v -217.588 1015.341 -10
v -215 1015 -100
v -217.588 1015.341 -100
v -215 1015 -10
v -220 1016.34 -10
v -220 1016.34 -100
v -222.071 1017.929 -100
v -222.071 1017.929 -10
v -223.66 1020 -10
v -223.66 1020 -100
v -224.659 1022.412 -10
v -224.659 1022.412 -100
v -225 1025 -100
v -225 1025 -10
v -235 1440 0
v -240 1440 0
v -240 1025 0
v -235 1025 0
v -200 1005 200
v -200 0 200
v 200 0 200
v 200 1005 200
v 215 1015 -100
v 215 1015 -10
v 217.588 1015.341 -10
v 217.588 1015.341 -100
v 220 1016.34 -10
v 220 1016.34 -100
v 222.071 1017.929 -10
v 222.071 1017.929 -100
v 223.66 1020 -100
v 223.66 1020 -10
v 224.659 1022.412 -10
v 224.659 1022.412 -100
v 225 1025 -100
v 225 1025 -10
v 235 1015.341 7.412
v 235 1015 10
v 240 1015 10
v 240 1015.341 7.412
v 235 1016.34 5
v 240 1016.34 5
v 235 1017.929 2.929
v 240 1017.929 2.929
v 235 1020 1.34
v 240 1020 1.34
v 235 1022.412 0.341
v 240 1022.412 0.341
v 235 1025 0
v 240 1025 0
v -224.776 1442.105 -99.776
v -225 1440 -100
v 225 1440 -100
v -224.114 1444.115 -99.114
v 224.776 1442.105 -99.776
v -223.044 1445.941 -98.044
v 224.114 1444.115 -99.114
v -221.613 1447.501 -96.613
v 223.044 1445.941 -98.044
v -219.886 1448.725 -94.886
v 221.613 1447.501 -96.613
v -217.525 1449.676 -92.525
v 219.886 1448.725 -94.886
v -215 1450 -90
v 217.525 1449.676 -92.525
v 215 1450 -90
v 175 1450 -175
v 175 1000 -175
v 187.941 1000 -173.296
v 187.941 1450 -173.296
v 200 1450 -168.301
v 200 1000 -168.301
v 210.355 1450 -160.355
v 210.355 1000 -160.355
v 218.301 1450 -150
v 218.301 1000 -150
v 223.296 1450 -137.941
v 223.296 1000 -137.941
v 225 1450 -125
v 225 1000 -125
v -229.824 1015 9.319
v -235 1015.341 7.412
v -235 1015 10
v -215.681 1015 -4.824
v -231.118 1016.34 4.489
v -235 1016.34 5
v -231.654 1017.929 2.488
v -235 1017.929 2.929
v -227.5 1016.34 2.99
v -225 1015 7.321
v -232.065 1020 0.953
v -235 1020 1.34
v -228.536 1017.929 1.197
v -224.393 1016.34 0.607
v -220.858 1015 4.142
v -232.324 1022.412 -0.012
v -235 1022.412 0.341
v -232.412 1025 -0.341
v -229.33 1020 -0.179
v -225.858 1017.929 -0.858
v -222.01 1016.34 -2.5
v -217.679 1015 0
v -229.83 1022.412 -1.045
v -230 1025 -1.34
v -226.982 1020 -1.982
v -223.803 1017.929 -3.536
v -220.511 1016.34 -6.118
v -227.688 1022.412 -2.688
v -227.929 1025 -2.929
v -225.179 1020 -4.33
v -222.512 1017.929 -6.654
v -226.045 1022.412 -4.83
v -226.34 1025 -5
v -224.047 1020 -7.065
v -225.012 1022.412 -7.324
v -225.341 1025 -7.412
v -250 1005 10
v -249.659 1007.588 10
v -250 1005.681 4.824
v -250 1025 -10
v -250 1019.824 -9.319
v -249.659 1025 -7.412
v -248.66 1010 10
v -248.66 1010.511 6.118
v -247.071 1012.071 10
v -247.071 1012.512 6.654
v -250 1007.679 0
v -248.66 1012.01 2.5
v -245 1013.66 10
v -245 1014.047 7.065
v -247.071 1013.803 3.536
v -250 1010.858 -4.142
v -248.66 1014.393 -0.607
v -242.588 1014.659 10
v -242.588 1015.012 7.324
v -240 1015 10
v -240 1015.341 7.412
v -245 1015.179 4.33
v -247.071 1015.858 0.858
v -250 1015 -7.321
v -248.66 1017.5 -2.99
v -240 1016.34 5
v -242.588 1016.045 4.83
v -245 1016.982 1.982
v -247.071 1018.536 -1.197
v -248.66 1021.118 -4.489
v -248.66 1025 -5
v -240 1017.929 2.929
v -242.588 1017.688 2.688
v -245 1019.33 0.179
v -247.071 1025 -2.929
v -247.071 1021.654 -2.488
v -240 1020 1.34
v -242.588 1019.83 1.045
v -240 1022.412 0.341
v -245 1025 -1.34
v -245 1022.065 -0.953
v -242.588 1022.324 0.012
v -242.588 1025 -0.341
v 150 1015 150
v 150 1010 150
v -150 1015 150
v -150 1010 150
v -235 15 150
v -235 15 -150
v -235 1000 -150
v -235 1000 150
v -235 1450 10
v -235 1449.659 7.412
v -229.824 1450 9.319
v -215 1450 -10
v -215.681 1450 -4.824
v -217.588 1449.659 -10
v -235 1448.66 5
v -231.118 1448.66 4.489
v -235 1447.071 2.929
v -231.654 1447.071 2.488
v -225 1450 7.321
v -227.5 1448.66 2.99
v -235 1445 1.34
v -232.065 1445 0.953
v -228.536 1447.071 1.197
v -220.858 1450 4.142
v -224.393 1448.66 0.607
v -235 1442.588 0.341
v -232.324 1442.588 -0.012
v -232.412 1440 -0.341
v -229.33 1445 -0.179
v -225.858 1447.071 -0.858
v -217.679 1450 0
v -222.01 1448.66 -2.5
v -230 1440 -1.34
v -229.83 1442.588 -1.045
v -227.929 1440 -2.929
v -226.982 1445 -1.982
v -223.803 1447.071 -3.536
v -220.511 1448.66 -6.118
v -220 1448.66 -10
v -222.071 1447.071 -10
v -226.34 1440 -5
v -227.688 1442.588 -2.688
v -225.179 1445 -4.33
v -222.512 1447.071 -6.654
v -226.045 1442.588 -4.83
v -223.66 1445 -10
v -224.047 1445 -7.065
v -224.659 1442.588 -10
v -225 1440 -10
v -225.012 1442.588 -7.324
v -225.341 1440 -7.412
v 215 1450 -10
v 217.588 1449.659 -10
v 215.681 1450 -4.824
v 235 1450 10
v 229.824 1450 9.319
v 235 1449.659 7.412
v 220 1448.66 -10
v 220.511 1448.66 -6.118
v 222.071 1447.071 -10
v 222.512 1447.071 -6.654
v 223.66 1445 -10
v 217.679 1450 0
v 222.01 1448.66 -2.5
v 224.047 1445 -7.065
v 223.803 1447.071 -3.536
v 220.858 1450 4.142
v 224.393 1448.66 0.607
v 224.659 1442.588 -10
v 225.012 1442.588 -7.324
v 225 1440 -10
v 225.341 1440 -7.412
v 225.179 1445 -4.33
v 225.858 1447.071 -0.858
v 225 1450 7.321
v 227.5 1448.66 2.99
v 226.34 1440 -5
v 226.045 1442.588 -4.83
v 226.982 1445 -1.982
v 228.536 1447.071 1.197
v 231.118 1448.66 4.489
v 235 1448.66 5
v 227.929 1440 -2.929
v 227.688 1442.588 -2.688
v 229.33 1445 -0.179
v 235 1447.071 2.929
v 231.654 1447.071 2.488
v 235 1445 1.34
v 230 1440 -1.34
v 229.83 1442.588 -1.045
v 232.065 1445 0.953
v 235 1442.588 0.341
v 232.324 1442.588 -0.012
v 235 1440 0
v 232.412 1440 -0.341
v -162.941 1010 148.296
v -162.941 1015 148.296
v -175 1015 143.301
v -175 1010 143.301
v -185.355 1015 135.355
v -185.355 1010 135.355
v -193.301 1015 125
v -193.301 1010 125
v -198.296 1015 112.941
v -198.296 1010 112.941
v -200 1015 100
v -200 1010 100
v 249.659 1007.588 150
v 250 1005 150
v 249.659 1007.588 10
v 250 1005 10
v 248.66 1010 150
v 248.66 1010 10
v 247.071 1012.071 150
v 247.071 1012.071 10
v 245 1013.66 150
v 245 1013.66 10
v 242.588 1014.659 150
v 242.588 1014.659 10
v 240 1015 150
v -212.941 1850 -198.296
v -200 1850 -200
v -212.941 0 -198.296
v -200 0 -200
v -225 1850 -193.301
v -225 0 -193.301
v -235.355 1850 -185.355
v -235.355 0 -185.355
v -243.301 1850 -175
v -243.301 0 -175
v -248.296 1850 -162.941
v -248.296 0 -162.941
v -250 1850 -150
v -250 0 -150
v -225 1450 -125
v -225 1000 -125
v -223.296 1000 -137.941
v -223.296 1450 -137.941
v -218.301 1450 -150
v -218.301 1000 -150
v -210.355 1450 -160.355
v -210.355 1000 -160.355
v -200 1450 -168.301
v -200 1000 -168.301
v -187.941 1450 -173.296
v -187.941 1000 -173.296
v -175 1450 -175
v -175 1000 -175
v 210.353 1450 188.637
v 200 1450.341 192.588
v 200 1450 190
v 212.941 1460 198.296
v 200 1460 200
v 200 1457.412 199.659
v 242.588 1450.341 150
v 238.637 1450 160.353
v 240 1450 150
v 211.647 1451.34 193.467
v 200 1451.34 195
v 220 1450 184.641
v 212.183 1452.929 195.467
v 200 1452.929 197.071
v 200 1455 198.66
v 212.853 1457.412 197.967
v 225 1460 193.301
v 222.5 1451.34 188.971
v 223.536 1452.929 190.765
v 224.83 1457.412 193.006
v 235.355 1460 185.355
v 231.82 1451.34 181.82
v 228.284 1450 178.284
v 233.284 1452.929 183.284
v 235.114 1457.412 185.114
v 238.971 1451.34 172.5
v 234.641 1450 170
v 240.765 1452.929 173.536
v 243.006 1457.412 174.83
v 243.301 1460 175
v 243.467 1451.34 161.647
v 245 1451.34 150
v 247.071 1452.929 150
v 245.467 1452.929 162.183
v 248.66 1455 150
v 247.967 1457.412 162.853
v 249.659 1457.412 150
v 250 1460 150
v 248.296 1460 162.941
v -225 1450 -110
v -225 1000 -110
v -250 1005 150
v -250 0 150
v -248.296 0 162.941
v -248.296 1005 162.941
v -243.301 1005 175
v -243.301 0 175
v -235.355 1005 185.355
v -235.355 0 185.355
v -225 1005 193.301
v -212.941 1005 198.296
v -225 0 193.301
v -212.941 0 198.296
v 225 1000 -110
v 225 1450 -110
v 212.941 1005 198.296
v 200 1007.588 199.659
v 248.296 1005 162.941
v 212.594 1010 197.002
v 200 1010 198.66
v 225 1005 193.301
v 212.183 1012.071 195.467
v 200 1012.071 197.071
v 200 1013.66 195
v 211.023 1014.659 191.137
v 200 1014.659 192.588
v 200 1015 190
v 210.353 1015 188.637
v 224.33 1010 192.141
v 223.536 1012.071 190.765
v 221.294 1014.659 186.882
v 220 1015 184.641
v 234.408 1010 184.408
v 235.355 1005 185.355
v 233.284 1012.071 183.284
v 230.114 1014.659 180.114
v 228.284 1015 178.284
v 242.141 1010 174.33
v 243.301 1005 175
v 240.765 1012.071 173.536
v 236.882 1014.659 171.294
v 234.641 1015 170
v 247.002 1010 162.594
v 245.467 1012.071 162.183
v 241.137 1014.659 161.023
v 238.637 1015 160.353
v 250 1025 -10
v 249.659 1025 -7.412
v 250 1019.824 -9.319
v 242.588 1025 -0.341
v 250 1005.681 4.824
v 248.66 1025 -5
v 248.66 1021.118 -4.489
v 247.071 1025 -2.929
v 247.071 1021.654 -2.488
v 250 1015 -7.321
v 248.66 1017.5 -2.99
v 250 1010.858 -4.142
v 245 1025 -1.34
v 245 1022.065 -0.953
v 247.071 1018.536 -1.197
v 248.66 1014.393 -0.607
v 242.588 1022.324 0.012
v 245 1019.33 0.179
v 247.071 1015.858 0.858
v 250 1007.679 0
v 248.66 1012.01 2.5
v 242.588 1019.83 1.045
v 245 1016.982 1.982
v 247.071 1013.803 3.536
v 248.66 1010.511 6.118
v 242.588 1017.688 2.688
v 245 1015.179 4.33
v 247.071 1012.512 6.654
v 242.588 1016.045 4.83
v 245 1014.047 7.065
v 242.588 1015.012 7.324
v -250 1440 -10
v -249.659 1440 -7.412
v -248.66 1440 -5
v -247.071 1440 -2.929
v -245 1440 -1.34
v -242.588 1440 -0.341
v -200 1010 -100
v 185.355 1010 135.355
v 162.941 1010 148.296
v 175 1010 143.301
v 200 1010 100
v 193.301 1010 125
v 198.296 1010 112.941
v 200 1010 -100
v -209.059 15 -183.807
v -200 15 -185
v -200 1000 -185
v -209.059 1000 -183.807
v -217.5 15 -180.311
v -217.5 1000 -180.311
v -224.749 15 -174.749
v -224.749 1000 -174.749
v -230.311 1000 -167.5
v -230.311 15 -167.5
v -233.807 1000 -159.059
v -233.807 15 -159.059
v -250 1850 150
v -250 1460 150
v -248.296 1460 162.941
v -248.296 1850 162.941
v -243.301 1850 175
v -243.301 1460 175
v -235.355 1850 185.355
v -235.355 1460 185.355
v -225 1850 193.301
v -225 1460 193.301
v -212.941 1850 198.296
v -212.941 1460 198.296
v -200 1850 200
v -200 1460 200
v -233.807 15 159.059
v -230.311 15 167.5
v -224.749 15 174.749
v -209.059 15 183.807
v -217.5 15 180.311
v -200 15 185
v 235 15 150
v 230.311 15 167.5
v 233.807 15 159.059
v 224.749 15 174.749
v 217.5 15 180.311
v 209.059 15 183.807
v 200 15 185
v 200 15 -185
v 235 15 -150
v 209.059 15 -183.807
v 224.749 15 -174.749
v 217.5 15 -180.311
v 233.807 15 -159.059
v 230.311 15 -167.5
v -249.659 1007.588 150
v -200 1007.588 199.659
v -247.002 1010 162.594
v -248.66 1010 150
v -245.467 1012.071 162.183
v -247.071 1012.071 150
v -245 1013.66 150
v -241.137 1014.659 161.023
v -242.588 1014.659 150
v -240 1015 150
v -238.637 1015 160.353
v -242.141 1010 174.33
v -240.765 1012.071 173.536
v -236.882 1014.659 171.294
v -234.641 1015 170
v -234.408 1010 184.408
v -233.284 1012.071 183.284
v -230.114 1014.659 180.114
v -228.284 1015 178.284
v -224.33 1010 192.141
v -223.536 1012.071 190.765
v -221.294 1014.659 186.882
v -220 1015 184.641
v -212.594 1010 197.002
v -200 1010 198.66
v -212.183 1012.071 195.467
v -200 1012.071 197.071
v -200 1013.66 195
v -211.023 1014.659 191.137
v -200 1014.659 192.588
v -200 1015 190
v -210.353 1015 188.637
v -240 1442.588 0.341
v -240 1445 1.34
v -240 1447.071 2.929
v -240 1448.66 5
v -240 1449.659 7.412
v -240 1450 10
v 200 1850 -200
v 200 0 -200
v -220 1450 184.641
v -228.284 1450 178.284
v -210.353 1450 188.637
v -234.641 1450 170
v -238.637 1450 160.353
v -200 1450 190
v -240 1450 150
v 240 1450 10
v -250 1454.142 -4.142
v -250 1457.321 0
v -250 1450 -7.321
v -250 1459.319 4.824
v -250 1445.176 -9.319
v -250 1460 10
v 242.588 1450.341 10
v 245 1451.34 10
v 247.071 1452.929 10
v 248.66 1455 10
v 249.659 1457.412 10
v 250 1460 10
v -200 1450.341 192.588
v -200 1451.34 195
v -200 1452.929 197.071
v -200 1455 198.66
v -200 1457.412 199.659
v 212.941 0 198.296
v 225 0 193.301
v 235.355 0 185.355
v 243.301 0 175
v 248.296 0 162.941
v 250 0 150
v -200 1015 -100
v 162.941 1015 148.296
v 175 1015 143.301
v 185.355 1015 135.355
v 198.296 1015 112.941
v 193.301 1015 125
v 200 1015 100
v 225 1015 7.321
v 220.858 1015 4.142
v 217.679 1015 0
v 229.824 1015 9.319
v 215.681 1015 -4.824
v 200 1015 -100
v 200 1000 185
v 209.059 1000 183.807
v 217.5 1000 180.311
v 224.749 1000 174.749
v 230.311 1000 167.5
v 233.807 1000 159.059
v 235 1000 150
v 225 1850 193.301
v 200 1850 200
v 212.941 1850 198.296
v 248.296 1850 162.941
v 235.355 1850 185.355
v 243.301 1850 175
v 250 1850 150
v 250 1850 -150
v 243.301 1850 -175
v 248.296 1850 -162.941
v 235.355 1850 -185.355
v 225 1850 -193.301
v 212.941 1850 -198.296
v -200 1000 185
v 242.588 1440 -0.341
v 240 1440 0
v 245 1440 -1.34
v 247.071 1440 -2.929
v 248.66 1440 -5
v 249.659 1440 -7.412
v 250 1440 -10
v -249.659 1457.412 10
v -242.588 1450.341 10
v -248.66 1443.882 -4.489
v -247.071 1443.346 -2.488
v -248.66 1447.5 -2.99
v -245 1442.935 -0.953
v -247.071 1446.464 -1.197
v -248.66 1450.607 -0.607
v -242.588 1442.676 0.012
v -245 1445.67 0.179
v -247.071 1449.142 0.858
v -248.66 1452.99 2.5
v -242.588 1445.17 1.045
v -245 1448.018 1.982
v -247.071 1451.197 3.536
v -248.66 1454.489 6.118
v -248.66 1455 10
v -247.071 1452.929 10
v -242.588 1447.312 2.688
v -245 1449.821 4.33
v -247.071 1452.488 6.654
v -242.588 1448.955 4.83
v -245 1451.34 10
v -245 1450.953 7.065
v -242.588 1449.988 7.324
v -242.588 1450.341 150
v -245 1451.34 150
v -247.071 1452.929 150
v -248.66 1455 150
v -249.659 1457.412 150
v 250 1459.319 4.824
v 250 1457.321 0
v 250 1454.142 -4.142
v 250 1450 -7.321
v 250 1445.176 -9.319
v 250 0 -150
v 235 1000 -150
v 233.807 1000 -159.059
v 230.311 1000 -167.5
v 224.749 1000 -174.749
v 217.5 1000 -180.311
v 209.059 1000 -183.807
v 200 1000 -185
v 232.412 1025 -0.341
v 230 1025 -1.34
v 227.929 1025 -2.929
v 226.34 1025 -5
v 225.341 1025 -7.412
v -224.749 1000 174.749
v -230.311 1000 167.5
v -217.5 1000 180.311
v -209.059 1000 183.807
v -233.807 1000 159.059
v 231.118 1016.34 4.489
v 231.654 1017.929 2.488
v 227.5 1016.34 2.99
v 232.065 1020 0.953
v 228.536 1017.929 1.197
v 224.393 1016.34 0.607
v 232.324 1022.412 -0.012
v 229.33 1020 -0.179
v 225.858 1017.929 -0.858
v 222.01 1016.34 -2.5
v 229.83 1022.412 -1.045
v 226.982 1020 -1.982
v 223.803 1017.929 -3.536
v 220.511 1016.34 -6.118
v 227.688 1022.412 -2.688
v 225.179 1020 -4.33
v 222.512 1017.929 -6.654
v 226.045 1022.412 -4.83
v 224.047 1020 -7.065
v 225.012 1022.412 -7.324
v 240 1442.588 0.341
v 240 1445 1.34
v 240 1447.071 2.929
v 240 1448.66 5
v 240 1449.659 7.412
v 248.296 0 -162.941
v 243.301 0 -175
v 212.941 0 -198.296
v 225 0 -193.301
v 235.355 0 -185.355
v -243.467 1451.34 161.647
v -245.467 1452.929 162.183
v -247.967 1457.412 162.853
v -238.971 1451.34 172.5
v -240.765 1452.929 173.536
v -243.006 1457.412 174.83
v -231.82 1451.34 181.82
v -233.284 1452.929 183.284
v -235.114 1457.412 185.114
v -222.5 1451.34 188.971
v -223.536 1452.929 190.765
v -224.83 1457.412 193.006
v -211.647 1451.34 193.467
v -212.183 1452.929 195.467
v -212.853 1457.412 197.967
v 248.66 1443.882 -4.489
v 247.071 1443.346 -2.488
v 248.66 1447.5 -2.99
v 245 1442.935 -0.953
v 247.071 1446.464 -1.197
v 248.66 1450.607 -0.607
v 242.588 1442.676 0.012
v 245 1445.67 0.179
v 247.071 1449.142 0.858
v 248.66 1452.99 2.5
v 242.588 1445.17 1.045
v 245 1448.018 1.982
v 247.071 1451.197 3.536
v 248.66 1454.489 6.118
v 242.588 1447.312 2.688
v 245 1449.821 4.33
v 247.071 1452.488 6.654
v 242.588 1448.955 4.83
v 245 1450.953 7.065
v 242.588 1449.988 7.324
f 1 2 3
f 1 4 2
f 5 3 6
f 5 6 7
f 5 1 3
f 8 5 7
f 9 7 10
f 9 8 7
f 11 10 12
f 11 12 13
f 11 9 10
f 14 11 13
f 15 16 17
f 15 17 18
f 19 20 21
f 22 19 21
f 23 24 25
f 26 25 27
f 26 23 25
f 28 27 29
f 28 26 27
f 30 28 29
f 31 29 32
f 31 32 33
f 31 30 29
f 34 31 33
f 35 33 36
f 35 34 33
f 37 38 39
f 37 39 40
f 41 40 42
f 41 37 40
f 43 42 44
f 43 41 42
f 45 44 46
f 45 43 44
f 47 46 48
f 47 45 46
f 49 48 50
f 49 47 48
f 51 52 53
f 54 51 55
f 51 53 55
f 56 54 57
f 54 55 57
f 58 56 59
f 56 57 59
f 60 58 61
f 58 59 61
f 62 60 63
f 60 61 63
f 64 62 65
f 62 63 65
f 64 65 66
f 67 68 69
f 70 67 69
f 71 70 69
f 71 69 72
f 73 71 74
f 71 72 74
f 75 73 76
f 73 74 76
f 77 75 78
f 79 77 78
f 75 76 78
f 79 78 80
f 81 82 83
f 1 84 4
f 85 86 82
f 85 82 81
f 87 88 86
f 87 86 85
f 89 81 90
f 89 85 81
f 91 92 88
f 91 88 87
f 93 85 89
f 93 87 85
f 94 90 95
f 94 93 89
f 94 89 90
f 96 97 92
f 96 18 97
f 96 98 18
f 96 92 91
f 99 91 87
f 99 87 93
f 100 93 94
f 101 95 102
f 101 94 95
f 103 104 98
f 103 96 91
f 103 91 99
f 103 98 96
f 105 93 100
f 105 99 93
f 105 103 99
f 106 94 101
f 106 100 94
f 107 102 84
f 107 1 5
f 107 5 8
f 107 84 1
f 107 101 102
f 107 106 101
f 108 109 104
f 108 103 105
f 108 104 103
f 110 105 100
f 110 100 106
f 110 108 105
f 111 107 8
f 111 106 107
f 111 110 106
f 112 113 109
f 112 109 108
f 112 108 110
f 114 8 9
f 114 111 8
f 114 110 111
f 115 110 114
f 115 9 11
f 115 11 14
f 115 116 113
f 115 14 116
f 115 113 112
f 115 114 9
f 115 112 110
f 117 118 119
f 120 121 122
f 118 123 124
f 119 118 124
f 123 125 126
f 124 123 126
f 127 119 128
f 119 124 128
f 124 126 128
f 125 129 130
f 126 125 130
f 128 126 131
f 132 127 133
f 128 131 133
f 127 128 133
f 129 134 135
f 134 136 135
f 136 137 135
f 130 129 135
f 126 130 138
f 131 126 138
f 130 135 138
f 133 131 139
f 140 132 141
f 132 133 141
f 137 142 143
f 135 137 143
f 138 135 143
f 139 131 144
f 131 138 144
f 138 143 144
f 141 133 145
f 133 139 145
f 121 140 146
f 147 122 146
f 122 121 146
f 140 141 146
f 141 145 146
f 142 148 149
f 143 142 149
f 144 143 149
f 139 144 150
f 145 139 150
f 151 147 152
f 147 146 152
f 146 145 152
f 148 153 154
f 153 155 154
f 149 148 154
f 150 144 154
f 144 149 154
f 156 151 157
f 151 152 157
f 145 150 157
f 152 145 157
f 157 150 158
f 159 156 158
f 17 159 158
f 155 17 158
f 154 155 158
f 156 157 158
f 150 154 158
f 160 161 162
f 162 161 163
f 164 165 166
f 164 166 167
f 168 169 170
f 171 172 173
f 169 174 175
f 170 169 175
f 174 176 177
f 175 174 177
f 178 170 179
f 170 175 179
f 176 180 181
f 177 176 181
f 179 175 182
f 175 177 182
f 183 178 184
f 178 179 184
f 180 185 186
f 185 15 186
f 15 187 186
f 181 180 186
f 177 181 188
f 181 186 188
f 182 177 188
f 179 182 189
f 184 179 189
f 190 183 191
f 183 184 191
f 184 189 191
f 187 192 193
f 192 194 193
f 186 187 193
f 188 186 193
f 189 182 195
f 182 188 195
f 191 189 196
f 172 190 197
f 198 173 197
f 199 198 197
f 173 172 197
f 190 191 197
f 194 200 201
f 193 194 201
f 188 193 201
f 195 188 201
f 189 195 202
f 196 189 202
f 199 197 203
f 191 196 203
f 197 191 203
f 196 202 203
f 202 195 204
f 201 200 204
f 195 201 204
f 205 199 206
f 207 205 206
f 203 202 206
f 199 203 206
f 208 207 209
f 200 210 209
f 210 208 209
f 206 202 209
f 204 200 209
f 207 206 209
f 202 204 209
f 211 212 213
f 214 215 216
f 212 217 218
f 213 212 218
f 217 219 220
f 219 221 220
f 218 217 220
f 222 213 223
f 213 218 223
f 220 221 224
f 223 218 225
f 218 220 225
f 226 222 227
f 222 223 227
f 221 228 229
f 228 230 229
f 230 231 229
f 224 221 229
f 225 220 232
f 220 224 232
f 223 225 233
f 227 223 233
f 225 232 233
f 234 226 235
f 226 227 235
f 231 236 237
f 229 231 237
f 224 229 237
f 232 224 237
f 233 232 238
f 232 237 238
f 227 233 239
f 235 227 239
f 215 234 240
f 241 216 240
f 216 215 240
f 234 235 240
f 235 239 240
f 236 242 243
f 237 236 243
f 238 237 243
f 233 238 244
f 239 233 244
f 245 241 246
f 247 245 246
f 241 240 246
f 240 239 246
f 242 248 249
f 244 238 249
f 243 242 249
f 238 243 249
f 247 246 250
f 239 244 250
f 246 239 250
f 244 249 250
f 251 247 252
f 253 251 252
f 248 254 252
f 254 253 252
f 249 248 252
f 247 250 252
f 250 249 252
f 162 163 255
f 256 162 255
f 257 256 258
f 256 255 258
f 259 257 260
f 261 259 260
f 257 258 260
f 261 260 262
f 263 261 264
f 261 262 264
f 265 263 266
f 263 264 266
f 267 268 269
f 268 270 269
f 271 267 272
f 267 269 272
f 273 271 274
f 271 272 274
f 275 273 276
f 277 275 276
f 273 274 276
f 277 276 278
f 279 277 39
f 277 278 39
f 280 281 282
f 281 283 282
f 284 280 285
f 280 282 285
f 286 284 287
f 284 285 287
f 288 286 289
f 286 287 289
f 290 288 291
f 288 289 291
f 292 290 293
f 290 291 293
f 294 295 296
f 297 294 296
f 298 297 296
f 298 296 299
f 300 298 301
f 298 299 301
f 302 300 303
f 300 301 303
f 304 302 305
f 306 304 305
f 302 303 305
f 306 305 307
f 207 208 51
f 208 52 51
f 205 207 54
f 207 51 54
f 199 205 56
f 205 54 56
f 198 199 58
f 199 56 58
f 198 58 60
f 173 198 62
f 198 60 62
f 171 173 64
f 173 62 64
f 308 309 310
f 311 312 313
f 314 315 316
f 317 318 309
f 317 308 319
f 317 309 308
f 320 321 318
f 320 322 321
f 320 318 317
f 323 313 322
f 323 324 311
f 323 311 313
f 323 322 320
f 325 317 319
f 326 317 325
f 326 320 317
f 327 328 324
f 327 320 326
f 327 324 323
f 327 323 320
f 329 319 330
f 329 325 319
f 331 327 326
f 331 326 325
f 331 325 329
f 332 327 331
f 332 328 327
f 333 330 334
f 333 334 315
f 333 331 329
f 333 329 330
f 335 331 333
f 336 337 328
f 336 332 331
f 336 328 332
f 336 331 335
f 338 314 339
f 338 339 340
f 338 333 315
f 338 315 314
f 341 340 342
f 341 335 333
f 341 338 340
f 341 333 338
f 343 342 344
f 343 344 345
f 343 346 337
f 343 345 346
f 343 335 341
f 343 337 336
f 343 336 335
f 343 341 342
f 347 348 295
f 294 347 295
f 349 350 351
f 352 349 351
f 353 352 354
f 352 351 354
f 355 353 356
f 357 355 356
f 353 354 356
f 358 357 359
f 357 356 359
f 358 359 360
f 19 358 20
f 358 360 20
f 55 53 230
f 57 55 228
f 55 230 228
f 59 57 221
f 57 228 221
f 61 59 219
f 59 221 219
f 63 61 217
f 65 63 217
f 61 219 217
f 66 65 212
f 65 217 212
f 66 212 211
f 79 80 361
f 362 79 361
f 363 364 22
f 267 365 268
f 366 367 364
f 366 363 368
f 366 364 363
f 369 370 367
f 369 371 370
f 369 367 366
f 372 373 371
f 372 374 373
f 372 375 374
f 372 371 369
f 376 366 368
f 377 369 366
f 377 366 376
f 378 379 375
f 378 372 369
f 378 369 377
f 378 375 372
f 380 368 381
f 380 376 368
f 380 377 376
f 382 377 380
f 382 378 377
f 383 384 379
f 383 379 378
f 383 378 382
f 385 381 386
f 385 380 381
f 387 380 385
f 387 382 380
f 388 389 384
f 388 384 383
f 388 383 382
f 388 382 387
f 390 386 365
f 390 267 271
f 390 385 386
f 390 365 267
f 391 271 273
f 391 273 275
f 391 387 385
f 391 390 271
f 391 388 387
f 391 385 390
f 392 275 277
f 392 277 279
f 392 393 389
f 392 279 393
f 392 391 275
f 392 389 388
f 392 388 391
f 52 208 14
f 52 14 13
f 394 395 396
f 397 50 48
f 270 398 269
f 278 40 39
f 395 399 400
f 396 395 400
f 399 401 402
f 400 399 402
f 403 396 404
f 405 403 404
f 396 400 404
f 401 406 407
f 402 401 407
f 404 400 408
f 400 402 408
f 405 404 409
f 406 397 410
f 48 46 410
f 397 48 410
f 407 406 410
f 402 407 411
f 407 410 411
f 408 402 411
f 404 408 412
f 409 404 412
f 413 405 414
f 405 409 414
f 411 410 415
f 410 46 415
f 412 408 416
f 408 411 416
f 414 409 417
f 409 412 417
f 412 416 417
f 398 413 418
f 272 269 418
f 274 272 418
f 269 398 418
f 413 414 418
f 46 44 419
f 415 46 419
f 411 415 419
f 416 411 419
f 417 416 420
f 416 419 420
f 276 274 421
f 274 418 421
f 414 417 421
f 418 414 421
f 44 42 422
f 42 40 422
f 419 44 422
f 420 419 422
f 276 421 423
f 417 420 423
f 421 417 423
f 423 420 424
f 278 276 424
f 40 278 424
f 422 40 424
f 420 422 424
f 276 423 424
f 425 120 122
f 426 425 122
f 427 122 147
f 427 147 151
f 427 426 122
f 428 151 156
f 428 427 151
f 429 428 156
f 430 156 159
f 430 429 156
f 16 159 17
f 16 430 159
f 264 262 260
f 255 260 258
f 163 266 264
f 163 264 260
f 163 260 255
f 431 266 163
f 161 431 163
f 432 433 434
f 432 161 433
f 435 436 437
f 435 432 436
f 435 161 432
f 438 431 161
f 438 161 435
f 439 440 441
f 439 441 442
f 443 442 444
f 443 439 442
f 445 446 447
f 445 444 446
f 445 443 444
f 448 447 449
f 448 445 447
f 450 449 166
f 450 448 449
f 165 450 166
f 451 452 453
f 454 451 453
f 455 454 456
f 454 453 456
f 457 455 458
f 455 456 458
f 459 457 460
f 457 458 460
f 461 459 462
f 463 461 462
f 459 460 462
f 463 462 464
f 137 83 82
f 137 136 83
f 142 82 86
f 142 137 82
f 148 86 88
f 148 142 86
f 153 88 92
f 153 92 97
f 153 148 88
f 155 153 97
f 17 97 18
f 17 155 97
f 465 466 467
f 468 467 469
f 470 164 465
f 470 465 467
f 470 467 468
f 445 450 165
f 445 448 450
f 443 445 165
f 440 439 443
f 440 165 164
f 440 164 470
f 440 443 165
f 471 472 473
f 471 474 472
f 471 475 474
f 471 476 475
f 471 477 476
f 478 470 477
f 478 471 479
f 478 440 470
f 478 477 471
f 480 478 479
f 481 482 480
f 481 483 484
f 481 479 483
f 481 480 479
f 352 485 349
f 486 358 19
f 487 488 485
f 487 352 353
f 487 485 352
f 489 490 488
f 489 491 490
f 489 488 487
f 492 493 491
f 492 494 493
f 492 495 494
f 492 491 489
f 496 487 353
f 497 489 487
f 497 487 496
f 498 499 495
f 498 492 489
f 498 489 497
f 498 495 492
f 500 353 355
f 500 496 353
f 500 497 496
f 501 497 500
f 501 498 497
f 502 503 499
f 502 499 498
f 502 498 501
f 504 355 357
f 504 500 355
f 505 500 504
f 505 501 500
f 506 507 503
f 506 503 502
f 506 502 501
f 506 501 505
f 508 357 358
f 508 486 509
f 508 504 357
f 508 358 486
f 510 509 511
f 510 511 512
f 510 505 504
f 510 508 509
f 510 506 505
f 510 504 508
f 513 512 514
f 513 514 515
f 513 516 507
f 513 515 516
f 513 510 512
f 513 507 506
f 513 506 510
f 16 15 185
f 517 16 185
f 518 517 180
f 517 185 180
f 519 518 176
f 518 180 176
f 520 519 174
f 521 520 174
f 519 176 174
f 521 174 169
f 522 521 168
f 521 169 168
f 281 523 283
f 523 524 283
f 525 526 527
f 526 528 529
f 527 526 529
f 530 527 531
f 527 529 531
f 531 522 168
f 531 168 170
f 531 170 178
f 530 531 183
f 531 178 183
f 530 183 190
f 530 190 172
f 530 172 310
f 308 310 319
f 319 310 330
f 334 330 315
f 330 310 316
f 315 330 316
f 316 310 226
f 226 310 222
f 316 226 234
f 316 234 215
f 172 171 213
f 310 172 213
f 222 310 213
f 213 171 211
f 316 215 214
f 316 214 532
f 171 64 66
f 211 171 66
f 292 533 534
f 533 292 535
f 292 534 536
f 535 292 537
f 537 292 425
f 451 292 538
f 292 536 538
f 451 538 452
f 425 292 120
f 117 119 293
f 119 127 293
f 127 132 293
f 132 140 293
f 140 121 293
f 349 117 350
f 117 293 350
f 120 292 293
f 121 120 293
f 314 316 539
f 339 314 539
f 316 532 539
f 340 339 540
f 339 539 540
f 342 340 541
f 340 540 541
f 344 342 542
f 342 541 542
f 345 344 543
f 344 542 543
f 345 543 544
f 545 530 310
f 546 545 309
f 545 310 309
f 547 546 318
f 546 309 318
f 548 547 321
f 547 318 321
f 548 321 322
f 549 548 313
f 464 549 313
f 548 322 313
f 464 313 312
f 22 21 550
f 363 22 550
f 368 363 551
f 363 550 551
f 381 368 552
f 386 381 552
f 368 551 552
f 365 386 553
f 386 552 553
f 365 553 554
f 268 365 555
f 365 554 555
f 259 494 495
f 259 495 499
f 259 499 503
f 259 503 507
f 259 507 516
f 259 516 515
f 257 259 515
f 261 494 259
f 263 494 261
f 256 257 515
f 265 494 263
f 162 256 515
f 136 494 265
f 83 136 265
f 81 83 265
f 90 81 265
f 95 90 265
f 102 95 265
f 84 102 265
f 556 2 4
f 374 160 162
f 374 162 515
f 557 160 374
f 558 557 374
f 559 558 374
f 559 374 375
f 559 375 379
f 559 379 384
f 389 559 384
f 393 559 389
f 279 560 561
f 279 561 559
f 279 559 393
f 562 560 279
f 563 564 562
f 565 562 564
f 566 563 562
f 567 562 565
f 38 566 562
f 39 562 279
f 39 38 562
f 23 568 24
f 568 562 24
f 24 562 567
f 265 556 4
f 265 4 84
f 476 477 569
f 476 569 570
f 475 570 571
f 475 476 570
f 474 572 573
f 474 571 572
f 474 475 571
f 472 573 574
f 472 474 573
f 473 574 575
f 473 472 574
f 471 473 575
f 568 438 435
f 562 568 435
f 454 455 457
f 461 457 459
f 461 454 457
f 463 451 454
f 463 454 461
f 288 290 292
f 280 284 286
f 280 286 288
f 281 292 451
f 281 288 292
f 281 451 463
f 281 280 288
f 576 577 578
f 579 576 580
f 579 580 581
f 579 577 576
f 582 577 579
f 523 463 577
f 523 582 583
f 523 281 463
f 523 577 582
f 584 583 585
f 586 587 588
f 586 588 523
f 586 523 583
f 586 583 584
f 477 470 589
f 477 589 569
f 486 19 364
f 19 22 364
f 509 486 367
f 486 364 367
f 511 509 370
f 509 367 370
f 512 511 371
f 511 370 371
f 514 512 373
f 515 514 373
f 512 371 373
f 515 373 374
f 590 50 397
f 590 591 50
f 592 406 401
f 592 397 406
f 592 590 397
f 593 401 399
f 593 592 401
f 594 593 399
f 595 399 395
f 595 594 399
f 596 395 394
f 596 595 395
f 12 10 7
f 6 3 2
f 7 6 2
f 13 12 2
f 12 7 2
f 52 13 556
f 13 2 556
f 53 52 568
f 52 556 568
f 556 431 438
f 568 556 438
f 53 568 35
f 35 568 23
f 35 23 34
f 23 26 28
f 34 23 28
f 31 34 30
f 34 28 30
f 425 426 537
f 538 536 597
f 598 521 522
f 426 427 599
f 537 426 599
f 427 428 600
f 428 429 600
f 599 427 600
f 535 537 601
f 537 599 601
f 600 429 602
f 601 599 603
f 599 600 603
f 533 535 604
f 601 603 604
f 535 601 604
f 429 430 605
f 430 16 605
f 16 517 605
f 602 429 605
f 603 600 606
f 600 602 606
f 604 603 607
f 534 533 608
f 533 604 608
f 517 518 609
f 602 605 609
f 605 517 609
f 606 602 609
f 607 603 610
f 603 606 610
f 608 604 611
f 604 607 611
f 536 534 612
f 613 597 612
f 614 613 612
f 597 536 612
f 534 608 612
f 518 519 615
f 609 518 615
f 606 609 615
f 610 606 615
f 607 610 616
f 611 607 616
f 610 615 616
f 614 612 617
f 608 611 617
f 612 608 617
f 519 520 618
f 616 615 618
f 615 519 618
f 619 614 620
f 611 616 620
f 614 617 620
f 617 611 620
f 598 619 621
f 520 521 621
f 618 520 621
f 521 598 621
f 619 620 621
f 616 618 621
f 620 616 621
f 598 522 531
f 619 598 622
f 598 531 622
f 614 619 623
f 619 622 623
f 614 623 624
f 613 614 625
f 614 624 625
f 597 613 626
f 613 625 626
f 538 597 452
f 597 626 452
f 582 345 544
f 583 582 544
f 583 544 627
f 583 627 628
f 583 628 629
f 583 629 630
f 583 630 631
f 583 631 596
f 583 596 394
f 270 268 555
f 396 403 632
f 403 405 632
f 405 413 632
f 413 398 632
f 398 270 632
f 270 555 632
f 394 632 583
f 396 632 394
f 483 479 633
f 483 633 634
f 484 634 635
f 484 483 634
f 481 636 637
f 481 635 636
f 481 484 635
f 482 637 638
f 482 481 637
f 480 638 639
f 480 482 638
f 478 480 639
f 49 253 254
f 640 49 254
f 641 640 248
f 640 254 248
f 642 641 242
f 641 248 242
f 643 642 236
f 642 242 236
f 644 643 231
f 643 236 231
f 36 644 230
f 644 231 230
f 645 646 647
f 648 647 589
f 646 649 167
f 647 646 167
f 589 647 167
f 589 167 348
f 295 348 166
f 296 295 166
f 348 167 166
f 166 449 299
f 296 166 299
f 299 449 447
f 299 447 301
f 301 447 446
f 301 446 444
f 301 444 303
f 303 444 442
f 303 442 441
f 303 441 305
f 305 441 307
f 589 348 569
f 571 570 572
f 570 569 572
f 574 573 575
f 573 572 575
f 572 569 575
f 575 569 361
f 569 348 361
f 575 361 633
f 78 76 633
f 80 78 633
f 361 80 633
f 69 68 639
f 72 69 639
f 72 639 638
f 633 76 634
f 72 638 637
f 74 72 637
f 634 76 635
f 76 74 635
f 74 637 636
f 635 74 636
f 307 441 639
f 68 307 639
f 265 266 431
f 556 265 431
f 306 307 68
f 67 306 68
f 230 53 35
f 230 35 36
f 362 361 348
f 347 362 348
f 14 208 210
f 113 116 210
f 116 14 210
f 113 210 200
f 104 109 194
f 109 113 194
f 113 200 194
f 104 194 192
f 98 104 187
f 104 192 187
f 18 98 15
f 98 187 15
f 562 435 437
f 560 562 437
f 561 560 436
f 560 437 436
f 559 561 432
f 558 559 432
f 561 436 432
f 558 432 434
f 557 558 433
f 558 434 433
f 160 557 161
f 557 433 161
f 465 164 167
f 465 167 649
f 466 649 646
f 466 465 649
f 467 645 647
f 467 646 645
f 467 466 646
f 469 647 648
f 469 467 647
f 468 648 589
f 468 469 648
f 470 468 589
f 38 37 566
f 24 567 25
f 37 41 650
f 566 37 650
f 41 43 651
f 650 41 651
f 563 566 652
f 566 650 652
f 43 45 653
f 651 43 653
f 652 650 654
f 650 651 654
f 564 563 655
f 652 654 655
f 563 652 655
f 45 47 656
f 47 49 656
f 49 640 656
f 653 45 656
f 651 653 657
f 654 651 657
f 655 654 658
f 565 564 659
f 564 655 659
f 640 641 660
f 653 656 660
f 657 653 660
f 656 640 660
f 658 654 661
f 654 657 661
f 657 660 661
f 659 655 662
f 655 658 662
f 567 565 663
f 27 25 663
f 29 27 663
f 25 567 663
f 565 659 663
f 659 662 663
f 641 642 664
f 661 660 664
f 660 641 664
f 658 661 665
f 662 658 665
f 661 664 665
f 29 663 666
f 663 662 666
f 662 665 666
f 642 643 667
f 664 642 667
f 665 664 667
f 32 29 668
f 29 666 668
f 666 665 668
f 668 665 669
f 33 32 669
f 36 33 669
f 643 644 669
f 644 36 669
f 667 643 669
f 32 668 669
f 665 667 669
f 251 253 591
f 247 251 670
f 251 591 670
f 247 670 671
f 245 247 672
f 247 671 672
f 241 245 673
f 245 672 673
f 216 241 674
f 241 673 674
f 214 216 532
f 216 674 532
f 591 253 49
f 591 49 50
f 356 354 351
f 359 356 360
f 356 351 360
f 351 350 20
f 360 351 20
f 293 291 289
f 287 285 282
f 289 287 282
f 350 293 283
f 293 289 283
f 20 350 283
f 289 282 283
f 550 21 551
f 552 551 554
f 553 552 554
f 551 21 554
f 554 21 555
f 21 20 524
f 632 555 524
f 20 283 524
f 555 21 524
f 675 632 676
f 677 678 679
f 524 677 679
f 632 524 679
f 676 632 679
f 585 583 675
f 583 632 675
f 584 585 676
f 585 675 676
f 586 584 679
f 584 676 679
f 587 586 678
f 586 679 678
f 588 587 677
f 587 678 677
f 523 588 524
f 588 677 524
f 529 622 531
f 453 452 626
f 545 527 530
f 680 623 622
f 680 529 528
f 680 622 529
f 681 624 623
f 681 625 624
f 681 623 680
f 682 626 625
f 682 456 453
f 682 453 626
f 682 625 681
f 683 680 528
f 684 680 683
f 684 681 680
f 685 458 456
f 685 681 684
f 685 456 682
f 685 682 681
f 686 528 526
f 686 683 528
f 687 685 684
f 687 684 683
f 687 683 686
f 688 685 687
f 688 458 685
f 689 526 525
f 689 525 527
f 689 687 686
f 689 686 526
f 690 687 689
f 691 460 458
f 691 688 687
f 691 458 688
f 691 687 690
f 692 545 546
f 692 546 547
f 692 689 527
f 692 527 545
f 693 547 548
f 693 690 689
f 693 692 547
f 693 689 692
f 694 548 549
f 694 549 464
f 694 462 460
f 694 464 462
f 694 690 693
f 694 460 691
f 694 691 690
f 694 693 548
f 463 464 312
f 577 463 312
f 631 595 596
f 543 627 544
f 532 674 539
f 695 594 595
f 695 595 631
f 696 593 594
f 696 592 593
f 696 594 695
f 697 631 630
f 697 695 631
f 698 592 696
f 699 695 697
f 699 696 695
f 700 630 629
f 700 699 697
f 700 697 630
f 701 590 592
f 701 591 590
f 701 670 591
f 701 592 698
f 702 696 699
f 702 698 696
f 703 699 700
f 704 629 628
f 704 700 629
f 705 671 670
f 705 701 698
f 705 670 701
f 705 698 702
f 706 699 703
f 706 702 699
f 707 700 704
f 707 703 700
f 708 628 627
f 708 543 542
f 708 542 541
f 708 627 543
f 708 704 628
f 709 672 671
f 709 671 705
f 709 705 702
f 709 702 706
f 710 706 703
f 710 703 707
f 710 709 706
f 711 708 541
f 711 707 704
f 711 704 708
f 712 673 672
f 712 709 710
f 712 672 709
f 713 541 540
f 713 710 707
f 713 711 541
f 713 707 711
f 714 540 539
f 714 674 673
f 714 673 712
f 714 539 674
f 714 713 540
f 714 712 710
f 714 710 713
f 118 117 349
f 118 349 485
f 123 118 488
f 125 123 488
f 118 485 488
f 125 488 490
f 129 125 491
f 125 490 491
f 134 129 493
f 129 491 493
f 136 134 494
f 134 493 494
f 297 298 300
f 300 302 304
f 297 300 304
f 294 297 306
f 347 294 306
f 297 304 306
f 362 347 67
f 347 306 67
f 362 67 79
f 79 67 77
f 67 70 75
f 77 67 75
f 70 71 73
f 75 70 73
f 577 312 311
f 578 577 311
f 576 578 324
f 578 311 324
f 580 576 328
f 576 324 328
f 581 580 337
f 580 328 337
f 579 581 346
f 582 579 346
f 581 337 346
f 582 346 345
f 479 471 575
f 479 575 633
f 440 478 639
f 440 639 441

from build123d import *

# Parameters (mm, degrees)
BOSS_EXTRUDE1_DEPTH = 1000
SHELL1_T            = -15
BOSS_EXTRUDE2_DEPTH = 10
BOSS_EXTRUDE3_DEPTH = 15
BOSS_EXTRUDE4_DEPTH = 450
BOSS_EXTRUDE7_DEPTH = 450
BOSS_EXTRUDE8_DEPTH = 400
FILLET3_R           = 10


# Read off the part's stored shape, not the designer's step: Boss-Extrude3
with BuildPart() as part:
    # Sketch1 → Boss-Extrude1 (new body)
    with BuildSketch(Plane(origin=(0, 0, 0), x_dir=(1, 0, 0), z_dir=(0, 1, 0))):
        with BuildLine():
            Line((-200, -200), (200, -200))
            ThreePointArc((200, -200), (235.355339059, -185.355339059), (250, -150))
            Line((250, -150), (250, 150))
            ThreePointArc((250, 150), (235.355339059, 185.355339059), (200, 200))
            Line((200, 200), (-200, 200))
            ThreePointArc((-200, 200), (-235.355339059, 185.355339059), (-250, 150))
            Line((-250, 150), (-250, -150))
            ThreePointArc((-250, -150), (-235.355339059, -185.355339059), (-200, -200))
        make_face()
    extrude(amount=BOSS_EXTRUDE1_DEPTH)

    # Shell1
    shell1_openings = [part.faces().sort_by_distance(p)[0] for p in [
        (0, 1000, 0),
    ]]
    offset(amount=SHELL1_T, openings=shell1_openings, kind=Kind.INTERSECTION)

    # Sketch3 → Boss-Extrude2 (add)
    with BuildSketch(Plane(origin=(0, 1000, 0), x_dir=(1, 0, 0), z_dir=(0, 1, 0))):
        with BuildLine():
            Line((200, 0), (200, 100))
            Line((200, 100), (-200, 100))
            Line((-200, 100), (-200, 0))
            Line((-200, 0), (-250, 0))
            Line((-250, 0), (-250, -150))
            ThreePointArc((-250, -150), (-235.355339059, -185.355339059), (-200, -200))
            Line((-200, -200), (200, -200))
            ThreePointArc((200, -200), (235.355339059, -185.355339059), (250, -150))
            Line((250, -150), (250, 0))
            Line((250, 0), (200, 0))
        make_face()
    extrude(amount=BOSS_EXTRUDE2_DEPTH)

    # Boss-Extrude3 outline → Boss-Extrude3 (add)
    with BuildSketch(Plane(origin=(0, 1000, 0), x_dir=(1, 0, 0), z_dir=(0, 1, 0))):
        with BuildLine():
            Line((200, 100), (200, -100))
            ThreePointArc((200, -100), (185.355339059, -135.355339059), (150, -150))
            Line((150, -150), (-150, -150))
            ThreePointArc((-150, -150), (-185.355339059, -135.355339059), (-200, -100))
            Line((-200, -100), (-200, 100))
            ThreePointArc((-200, 100), (-199.74680765, 105.0254481), (-198.989794856, 110))
            Line((-198.989794856, 110), (-225, 110))
            Line((-225, 110), (-225, 0))
            Line((-225, 0), (-250, 0))
            Line((-250, 0), (-250, -150))
            ThreePointArc((-250, -150), (-235.355339059, -185.355339059), (-200, -200))
            Line((-200, -200), (200, -200))
            ThreePointArc((200, -200), (235.355339059, -185.355339059), (250, -150))
            Line((250, -150), (250, 0))
            Line((250, 0), (225, 0))
            Line((225, 0), (225, 110))
            Line((225, 110), (198.989794856, 110))
            ThreePointArc((198.989794856, 110), (199.74680765, 105.0254481), (200, 100))
        make_face()
    extrude(amount=BOSS_EXTRUDE3_DEPTH)

    # Sketch3<5> → Boss-Extrude4 (add)
    with BuildSketch(Plane(origin=(0, 1000, 0), x_dir=(1, 0, 0), z_dir=(0, 1, 0))):
        with BuildLine():
            Line((-250, 0), (-225, 0))
            Line((-225, 0), (-225, 100))
            Line((-225, 100), (-225, 110))
            Line((-225, 110), (-225, 125))
            ThreePointArc((-225, 125), (-210.355339059, 160.355339059), (-175, 175))
            Line((-175, 175), (175, 175))
            ThreePointArc((175, 175), (210.355339059, 160.355339059), (225, 125))
            Line((225, 125), (225, 110))
            Line((225, 110), (225, 100))
            Line((225, 100), (225, 0))
            Line((225, 0), (250, 0))
            Line((250, 0), (250, 150))
            ThreePointArc((250, 150), (235.355339059, 185.355339059), (200, 200))
            Line((200, 200), (-200, 200))
            ThreePointArc((-200, 200), (-235.355339059, 185.355339059), (-250, 150))
            Line((-250, 150), (-250, 0))
        make_face()
    extrude(amount=BOSS_EXTRUDE4_DEPTH)

    # Sketch3<7> → Boss-Extrude7 (add)
    with BuildSketch(Plane(origin=(0, 1000, 0), x_dir=(1, 0, 0), z_dir=(0, 1, 0))):
        with BuildLine():
            ThreePointArc((-198.989794856, 110), (-199.74680765, 105.0254481), (-200, 100))
            Line((-200, 100), (200, 100))
            ThreePointArc((200, 100), (199.74680765, 105.0254481), (198.989794856, 110))
            Line((198.989794856, 110), (-198.989794856, 110))
        make_face()
        with BuildLine():
            ThreePointArc((198.989794856, 110), (199.74680765, 105.0254481), (200, 100))
            Line((200, 100), (225, 100))
            Line((225, 100), (225, 110))
            Line((225, 110), (198.989794856, 110))
        make_face()
        with BuildLine():
            Line((-225, 100), (-200, 100))
            ThreePointArc((-200, 100), (-199.74680765, 105.0254481), (-198.989794856, 110))
            Line((-198.989794856, 110), (-225, 110))
            Line((-225, 110), (-225, 100))
        make_face()
    extrude(amount=BOSS_EXTRUDE7_DEPTH)

    # Sketch5 → Boss-Extrude8 (add)
    with BuildSketch(Plane(origin=(0, 1450, 0), x_dir=(1, 0, 0), z_dir=(0, 1, 0))):
        with BuildLine():
            Line((-200, -200), (200, -200))
            ThreePointArc((200, -200), (235.355339059, -185.355339059), (250, -150))
            Line((250, -150), (250, 150))
            ThreePointArc((250, 150), (235.355339059, 185.355339059), (200, 200))
            Line((200, 200), (-200, 200))
            ThreePointArc((-200, 200), (-235.355339059, 185.355339059), (-250, 150))
            Line((-250, 150), (-250, -150))
            ThreePointArc((-250, -150), (-235.355339059, -185.355339059), (-200, -200))
        make_face()
    extrude(amount=BOSS_EXTRUDE8_DEPTH)

    # Fillet3
    fillet3_edges = [part.edges().sort_by_distance(p)[0] for p in [
        (-225, 1232.5, 0),
        (225, 1450, -50),
        (237.5, 1450, 0),
        (225, 1232.5, 0),
        (-237.5, 1450, 0),
        (-250, 1232.5, 0),
        (250, 1232.5, 0),
        (-225, 1450, -50),
        (0, 1450, -100),
        (-235.355339059, 1450, 185.355339059),
        (0, 1450, 200),
        (235.355339059, 1450, 185.355339059),
        (250, 1450, 75),
        (-250, 1450, 75),
        (-237.5, 1015, 0),
        (0, 1015, 200),
        (250, 1015, 75),
        (237.5, 1015, 0),
        (225, 1015, -50),
        (235.355339059, 1015, 185.355339059),
        (-250, 1015, 75),
        (-235.355339059, 1015, 185.355339059),
        (-225, 1015, -50),
    ]]
    fillet(fillet3_edges, radius=FILLET3_R)


solid = part.part
